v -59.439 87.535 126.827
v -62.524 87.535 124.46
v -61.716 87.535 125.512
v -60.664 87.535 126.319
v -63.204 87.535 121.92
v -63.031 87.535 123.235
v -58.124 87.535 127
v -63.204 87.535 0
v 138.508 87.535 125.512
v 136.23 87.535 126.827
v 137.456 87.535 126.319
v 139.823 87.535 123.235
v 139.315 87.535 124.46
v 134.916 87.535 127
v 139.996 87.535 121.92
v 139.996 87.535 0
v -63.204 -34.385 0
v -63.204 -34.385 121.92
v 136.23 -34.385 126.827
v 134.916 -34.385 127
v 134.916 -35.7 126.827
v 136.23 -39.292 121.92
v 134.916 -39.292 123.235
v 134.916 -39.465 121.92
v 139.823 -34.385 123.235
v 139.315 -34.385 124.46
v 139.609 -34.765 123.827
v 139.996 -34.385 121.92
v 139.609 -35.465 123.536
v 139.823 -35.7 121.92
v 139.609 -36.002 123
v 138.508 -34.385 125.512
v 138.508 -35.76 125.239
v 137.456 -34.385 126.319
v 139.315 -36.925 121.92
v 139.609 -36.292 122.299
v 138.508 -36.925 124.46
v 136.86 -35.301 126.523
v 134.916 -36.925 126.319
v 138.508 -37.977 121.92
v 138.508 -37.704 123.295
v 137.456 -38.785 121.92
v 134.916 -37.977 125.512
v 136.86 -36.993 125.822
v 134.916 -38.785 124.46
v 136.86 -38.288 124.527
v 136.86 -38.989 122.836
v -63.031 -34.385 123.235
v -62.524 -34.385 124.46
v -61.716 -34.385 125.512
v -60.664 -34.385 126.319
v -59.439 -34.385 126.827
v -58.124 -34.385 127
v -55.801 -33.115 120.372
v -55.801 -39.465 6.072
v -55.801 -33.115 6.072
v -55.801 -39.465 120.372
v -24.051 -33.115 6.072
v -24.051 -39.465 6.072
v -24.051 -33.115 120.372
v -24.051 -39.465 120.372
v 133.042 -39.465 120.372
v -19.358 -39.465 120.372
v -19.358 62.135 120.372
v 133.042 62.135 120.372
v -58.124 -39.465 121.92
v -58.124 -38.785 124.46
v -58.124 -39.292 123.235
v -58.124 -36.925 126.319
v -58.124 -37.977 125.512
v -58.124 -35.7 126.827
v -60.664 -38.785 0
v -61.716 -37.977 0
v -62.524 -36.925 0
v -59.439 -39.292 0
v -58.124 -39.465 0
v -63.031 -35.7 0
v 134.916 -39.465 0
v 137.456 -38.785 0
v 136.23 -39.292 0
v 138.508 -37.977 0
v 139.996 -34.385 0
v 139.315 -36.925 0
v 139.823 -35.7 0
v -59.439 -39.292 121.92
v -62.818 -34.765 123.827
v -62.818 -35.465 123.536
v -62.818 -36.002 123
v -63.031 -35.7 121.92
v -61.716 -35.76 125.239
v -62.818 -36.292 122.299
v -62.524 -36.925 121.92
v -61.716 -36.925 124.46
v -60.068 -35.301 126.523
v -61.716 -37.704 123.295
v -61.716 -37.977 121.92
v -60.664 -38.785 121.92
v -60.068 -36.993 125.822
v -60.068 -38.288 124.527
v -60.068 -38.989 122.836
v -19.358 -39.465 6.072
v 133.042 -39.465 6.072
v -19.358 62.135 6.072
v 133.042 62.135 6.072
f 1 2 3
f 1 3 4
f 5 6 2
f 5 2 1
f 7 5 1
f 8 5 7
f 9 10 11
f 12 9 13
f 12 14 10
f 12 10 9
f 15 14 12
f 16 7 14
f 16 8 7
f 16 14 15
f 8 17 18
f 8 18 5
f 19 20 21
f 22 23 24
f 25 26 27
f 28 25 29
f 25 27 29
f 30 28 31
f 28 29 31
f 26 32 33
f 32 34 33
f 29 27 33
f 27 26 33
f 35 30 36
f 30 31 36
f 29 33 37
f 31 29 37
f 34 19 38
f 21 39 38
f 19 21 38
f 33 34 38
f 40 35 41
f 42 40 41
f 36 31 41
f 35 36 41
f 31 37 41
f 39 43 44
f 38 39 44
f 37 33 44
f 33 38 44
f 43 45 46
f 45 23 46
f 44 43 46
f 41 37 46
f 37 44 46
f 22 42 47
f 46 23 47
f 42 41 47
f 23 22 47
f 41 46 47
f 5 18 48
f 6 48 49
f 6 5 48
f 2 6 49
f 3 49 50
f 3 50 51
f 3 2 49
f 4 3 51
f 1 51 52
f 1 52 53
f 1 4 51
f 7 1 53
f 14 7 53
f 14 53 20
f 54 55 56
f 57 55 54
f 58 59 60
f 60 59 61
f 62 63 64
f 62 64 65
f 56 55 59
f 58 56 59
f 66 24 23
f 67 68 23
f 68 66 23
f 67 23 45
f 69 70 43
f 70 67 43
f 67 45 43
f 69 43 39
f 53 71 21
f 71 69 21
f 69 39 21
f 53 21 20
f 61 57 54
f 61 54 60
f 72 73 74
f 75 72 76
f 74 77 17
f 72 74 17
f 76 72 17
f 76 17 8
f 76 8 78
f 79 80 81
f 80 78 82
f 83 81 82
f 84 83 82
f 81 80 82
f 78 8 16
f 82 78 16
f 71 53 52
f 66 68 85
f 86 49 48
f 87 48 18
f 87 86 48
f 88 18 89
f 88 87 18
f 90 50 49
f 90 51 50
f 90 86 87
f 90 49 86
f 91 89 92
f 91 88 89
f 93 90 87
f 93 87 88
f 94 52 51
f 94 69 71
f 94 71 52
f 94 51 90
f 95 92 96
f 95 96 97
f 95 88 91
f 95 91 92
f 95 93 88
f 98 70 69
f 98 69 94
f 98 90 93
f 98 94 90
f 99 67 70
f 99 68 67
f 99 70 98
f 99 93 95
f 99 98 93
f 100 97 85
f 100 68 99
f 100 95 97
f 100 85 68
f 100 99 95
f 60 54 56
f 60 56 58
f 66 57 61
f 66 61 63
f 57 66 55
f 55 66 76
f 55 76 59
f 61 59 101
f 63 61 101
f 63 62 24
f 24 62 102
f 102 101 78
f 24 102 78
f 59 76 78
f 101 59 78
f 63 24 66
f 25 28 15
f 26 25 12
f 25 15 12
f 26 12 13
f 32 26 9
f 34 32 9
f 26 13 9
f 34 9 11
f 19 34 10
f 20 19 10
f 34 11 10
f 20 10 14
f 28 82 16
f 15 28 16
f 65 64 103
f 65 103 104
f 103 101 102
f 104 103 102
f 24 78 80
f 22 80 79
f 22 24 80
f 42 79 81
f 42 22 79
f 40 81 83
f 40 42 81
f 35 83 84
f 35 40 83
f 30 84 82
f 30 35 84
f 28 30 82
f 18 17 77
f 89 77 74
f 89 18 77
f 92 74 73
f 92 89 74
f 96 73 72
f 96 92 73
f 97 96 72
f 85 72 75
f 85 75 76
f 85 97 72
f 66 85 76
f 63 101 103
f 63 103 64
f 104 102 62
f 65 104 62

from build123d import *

# Parameters (mm, degrees)
F0_W     = 203.2
F0_H     = 127
F1_DEPTH = 127
F2_R     = 5.08
F3_W     = 152.4
F3_H     = 114.3
F4_DEPTH = 101.6
F3_W_2   = 31.75
F5_DEPTH = 6.35


with BuildPart() as f1:
    # F0 (on Top) → F1 (new body)
    with BuildSketch(Plane.XY):
        with Locations((38.395604, 24.034617)):
            Rectangle(F0_W, F0_H)
    extrude(amount=F1_DEPTH)

    # F2
    f2_edges = [f1.edges().sort_by_distance(p)[0] for p in [
        (38.395604, -39.465383, 127),
        (-63.204396, 24.034617, 127),
        (139.995604, 24.034617, 127),
        (139.995604, -39.465383, 63.5),
        (-63.204396, -39.465383, 63.5),
    ]]
    fillet(f2_edges, radius=F2_R)

    # F3 (on face) → F4 (cut)
    with BuildSketch(Plane.XZ.offset(39.465383)):
        with Locations((56.842002, 63.221574)):
            Rectangle(F3_W, F3_H)
    extrude(amount=-F4_DEPTH, mode=Mode.SUBTRACT)

    # F3 (on face) → F5 (cut)
    with BuildSketch(Plane.XZ.offset(39.465383)):
        with Locations((56.842002, 63.221574)):
            Rectangle(F3_W, F3_H)
        with Locations((-39.926485, 63.221574)):
            Rectangle(F3_W_2, F3_H)
    extrude(amount=-F5_DEPTH, mode=Mode.SUBTRACT)


solid = f1.part
